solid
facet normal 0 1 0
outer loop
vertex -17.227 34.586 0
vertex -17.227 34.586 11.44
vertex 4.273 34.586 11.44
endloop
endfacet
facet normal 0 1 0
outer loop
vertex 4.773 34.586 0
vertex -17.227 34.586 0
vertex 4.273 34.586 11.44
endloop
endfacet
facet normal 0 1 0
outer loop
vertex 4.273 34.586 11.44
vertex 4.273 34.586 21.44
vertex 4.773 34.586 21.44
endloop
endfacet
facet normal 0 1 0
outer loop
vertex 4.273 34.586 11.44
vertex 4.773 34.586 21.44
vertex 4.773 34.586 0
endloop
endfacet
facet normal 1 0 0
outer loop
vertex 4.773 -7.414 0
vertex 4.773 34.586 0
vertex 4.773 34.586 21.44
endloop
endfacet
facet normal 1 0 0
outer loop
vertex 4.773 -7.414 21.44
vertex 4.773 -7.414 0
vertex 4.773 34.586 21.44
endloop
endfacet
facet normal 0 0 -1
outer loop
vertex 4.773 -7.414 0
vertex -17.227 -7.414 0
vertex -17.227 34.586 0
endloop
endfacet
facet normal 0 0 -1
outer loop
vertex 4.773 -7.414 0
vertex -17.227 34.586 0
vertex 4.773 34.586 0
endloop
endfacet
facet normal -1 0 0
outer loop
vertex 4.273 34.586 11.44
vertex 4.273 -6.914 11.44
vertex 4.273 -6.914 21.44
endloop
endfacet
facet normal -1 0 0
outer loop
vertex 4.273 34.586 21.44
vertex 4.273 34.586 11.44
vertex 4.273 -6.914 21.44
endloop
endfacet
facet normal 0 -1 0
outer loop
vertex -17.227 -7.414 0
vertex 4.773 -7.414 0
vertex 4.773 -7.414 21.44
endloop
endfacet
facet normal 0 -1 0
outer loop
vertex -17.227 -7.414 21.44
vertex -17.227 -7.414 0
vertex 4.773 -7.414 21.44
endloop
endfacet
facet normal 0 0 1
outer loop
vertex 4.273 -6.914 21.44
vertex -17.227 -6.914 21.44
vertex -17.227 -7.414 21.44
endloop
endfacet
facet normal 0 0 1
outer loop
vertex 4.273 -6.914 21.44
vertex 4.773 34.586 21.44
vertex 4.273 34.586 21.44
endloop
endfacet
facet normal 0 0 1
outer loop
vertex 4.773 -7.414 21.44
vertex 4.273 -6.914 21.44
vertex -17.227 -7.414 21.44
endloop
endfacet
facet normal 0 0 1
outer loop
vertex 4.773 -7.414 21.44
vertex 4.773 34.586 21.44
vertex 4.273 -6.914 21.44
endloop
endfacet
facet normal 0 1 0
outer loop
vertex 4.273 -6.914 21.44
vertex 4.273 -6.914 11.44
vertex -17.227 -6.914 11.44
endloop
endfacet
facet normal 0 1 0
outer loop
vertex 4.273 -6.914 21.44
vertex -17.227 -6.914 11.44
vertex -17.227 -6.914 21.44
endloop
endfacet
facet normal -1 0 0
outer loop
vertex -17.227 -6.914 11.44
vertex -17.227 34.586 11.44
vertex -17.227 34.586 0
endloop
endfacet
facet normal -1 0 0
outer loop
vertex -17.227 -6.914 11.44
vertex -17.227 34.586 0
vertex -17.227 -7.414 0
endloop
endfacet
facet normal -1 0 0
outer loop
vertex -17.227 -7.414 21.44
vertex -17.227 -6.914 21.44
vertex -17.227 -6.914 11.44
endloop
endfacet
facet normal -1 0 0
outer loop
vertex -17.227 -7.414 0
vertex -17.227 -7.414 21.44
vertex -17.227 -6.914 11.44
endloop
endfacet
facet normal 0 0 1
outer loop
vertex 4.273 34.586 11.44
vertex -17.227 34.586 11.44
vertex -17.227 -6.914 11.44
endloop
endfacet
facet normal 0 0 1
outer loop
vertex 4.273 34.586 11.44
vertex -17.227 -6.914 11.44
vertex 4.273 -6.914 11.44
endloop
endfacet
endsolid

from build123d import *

# Parameters (mm, degrees)
F0_W     = 22
F0_H     = 42
F1_DEPTH = 11.44
F2_W     = 0.5
F2_H     = 10
F3_DEPTH = 42
F4_W     = 0.5
F4_H     = 10
F5_DEPTH = 21.5


with BuildPart() as f1:
    # F0 (on Top) → F1 (new body)
    with BuildSketch(Plane.XY):
        with Locations((-6.227273, 13.585612)):
            Rectangle(F0_W, F0_H)
    extrude(amount=F1_DEPTH)

    # F2 (on face) → F3 (join)
    with BuildSketch(Plane.XZ.offset(7.414388)):
        with Locations((4.522727, 16.44)):
            Rectangle(F2_W, F2_H)
    extrude(amount=-F3_DEPTH)

    # F4 (on face) → F5 (join)
    with BuildSketch(Plane(origin=(4.272727, 0, 0), x_dir=(0, -1, 0), z_dir=(-1, 0, 0))):
        with Locations((7.164388, 16.44)):
            Rectangle(F4_W, F4_H)
    extrude(amount=F5_DEPTH)


solid = f1.part
